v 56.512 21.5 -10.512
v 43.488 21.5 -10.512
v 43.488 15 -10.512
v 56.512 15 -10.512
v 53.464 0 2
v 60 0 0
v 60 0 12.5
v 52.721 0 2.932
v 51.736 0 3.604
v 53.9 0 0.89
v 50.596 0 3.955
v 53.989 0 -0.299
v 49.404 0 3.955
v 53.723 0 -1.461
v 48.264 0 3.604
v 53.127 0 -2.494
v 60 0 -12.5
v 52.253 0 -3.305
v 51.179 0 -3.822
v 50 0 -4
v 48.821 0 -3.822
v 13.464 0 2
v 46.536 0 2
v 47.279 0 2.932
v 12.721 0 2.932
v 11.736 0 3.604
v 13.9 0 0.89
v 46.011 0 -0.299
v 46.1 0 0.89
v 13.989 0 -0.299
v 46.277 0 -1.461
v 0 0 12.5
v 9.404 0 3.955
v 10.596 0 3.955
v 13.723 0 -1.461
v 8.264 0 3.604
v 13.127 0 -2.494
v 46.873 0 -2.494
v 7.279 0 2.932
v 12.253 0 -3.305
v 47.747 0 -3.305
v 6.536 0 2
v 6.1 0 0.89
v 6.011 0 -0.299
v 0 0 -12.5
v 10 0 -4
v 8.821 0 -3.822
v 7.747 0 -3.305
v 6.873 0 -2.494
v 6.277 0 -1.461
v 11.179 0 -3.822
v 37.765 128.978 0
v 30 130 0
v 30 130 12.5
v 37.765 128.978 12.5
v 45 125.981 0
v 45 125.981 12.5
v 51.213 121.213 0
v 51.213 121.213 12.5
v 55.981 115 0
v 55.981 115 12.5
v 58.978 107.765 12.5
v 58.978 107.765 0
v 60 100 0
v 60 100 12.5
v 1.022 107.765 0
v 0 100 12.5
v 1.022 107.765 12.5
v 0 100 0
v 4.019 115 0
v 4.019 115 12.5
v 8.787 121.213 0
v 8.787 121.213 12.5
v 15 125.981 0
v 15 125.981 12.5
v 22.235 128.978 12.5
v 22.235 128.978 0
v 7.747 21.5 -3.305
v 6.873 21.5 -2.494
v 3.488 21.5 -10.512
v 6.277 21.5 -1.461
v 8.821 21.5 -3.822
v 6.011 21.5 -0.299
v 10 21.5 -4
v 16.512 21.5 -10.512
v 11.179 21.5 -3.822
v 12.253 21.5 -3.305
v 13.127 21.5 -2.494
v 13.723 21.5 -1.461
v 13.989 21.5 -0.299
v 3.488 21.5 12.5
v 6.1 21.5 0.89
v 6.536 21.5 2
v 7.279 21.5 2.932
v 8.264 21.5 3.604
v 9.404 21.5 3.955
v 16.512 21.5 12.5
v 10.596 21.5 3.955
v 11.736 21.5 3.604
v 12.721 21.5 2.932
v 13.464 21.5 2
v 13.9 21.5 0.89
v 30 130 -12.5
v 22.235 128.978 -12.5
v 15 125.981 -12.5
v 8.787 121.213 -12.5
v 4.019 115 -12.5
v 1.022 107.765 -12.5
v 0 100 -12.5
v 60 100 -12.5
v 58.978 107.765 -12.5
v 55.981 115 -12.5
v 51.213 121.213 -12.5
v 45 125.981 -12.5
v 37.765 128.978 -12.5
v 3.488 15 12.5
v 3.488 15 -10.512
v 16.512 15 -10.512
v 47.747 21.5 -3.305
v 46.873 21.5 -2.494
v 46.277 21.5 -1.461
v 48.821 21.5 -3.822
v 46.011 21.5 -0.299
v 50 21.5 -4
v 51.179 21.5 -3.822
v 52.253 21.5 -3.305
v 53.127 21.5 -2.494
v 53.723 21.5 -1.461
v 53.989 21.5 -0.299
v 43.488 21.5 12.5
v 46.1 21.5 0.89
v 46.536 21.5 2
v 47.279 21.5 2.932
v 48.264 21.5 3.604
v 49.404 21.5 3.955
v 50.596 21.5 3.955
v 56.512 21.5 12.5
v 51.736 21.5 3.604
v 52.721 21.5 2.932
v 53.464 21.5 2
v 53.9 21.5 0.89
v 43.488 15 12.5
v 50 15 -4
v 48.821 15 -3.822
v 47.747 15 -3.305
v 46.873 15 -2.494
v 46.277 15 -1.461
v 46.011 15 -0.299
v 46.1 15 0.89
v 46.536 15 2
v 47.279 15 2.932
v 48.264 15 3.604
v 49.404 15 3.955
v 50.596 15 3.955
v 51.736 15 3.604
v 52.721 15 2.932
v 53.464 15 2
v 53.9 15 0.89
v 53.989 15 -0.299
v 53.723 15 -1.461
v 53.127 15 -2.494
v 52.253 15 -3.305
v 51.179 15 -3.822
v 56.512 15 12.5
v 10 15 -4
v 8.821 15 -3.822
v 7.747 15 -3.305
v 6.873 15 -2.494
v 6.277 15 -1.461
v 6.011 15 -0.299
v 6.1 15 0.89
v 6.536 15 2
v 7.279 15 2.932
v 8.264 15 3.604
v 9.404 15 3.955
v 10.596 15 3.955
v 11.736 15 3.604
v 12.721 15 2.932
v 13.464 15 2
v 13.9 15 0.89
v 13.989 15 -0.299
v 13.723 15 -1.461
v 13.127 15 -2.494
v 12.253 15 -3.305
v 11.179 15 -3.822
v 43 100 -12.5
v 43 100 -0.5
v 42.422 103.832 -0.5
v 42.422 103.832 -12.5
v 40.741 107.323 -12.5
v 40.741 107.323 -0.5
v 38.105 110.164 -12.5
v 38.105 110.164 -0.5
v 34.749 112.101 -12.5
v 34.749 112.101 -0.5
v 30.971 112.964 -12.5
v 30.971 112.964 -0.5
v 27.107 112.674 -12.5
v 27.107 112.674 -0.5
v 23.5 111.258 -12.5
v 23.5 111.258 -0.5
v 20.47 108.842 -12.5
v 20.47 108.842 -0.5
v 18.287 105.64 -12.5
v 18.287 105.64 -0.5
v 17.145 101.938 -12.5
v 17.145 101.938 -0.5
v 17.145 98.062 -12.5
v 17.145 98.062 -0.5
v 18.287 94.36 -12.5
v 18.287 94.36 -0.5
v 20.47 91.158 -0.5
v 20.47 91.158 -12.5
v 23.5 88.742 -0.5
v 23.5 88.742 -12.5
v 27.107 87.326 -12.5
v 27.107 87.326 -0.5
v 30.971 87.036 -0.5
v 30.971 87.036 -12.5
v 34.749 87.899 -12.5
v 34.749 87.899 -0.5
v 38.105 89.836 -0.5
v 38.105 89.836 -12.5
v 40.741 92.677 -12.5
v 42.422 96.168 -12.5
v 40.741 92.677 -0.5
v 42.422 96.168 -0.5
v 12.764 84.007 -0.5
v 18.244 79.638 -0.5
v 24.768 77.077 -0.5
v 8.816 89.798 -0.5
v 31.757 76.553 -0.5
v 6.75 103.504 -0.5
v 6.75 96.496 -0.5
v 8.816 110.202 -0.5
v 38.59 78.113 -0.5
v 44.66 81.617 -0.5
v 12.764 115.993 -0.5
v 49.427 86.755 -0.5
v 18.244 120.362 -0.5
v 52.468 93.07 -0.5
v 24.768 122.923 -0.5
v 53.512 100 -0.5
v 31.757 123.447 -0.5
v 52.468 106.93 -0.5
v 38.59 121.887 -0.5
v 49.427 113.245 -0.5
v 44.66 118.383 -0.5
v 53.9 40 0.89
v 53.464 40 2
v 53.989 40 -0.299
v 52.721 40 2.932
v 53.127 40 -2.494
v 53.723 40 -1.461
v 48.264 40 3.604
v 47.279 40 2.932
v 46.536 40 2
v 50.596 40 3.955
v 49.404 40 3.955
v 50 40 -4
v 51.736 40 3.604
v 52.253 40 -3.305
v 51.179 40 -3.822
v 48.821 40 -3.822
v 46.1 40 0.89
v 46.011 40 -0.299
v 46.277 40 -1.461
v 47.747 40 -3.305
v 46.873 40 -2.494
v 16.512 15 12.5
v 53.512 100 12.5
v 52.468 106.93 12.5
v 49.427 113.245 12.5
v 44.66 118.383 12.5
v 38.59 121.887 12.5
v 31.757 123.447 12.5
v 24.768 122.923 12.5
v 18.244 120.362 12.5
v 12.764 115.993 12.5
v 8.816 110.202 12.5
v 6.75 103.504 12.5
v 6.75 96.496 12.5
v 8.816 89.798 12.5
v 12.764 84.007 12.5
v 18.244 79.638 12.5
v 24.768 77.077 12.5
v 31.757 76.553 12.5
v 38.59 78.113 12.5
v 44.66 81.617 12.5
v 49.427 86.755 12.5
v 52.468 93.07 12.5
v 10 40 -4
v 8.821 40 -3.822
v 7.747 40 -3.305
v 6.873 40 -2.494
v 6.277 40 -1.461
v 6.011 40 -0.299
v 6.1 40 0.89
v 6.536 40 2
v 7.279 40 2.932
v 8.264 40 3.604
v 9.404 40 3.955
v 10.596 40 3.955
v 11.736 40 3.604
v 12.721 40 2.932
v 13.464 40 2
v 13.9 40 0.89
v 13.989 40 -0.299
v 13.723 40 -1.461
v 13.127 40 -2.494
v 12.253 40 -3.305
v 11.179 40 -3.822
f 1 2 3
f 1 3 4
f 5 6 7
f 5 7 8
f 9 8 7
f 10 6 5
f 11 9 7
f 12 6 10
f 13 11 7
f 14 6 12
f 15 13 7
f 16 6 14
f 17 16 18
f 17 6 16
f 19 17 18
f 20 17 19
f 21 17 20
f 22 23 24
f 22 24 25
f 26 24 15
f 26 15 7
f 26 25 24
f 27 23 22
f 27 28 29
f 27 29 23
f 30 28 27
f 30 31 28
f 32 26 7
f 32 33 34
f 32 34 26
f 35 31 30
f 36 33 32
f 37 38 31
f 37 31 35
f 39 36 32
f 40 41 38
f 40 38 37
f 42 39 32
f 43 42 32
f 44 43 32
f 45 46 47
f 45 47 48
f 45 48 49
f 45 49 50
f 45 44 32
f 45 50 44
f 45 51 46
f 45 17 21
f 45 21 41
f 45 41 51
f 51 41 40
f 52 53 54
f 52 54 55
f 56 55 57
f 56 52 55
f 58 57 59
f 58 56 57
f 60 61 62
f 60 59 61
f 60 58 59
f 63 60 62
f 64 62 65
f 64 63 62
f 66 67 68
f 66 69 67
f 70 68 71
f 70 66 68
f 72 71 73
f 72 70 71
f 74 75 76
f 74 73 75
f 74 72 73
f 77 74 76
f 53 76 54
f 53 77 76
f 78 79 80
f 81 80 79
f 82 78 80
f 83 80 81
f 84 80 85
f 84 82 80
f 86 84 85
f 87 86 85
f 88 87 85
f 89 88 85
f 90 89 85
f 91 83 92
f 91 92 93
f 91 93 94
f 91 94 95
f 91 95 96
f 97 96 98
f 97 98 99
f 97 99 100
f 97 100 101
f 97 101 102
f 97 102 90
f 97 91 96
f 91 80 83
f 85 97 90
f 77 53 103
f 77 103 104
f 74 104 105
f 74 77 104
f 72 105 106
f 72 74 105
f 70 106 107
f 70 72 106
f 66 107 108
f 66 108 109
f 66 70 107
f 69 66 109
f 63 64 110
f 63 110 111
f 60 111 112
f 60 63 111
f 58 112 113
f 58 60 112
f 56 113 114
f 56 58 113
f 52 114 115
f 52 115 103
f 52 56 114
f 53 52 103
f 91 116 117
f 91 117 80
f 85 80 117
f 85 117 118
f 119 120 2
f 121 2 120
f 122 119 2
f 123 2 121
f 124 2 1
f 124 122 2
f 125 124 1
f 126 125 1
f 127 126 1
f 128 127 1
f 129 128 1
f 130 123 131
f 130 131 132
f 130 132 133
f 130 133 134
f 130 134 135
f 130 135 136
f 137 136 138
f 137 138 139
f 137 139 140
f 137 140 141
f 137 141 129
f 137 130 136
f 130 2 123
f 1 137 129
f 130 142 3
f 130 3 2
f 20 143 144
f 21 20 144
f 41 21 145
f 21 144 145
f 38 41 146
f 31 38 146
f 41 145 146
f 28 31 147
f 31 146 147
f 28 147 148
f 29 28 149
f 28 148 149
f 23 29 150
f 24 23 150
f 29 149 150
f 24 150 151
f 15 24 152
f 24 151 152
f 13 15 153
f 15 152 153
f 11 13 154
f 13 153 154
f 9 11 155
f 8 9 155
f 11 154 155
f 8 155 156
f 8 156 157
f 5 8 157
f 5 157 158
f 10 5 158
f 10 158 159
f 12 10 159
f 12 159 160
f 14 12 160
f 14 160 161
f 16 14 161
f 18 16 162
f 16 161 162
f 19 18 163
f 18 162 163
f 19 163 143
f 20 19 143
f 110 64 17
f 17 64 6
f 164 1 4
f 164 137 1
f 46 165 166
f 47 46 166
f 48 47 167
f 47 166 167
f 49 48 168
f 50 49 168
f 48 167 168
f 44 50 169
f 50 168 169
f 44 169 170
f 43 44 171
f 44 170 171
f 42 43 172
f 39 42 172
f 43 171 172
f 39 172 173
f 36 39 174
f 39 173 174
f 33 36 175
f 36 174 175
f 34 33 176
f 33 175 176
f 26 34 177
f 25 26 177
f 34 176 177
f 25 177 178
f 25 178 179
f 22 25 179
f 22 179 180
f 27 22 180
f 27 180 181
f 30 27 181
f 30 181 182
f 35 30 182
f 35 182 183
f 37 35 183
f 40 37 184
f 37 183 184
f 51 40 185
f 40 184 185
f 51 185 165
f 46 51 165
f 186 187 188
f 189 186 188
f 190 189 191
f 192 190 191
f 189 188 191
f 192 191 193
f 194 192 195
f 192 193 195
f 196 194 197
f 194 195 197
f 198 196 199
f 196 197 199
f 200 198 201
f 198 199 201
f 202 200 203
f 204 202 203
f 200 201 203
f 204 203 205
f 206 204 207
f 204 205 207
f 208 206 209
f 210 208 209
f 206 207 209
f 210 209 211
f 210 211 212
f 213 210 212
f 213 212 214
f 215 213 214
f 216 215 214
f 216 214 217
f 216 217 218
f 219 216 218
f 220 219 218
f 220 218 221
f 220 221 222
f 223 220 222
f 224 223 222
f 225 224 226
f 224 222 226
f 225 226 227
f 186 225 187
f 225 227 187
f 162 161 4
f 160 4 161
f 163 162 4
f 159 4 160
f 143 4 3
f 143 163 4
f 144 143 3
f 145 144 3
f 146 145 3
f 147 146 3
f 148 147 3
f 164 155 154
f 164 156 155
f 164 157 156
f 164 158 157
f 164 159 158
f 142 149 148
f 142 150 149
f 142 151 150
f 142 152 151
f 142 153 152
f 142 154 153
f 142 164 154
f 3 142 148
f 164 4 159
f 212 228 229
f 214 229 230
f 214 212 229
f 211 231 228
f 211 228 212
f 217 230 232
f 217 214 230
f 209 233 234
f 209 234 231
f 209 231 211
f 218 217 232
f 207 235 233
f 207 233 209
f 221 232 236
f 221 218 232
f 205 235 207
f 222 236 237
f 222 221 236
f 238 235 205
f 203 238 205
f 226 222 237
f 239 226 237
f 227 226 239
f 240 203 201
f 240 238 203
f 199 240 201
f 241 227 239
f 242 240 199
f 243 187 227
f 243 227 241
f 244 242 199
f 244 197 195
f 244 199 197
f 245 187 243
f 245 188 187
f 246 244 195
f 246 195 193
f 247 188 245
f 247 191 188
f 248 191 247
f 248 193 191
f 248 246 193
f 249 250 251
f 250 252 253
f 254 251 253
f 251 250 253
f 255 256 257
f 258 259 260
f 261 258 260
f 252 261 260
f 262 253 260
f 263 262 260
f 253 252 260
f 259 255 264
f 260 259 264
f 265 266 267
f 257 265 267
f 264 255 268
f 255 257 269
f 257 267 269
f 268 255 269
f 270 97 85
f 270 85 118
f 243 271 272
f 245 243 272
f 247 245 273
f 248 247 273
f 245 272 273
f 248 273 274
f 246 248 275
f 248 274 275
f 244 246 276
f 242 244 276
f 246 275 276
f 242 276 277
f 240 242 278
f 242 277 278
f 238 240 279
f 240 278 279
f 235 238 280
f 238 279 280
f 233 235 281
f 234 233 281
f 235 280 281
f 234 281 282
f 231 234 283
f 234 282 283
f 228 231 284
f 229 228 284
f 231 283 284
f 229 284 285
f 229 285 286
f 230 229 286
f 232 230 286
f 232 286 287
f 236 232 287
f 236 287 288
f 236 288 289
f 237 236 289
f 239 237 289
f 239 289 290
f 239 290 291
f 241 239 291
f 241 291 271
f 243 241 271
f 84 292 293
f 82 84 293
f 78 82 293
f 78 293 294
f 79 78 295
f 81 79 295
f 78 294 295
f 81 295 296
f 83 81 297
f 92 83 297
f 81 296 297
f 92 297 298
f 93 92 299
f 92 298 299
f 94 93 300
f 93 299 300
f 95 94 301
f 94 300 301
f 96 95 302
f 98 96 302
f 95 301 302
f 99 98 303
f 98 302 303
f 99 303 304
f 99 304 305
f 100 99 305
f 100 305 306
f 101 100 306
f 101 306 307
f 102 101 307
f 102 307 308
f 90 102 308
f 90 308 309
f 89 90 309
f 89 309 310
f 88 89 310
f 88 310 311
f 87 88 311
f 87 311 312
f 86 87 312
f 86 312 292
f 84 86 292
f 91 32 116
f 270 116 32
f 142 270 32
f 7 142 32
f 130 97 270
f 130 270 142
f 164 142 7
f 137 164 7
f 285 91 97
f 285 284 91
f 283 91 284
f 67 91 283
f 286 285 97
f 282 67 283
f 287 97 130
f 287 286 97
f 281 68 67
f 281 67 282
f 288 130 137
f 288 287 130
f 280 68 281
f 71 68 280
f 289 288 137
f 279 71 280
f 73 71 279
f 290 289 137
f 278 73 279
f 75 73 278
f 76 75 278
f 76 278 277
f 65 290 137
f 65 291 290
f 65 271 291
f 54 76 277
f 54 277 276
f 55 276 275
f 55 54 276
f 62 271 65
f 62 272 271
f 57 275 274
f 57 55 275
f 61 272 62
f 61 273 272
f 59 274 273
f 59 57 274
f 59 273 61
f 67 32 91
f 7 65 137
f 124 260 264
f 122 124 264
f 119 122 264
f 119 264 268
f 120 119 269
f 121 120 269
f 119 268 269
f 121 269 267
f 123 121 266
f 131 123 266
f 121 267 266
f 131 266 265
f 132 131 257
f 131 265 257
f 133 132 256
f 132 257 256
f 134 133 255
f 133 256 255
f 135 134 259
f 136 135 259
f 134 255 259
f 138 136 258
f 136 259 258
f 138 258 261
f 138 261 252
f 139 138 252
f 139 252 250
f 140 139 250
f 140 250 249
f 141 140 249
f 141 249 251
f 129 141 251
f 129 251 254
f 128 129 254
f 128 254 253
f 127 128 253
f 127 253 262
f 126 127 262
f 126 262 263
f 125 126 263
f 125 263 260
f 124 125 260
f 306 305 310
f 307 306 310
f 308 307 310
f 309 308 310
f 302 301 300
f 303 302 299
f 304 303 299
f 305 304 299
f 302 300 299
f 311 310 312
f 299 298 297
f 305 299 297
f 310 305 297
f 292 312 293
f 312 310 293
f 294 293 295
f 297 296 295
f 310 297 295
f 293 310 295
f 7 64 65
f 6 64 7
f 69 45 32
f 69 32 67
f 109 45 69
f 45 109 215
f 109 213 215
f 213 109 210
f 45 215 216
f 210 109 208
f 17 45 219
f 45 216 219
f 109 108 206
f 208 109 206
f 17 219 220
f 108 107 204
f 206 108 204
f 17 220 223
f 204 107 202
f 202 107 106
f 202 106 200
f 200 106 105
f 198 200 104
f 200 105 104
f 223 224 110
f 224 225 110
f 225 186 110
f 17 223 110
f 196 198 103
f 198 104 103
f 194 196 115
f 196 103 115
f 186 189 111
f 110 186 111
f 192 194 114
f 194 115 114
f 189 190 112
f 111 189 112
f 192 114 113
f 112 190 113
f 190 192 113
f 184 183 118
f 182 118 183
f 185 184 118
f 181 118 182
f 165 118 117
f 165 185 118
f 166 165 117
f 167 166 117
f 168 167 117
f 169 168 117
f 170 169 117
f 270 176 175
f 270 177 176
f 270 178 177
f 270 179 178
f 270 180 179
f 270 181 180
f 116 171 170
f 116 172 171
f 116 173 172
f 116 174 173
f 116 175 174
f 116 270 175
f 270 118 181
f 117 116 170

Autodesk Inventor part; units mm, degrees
ref_plane "YZ Plane" through (0, 0, 0) normal (1, 0, 0) x (0, 1, 0)
ref_plane "XZ Plane" through (0, 0, 0) normal (0, 1, 0) x (-1, 0, 0)
ref_plane "XY Plane" through (0, 0, 0) normal (0, 0, 1) x (1, 0, 0)
sketch "Boceto1" plane through (0, 0, 0) normal (0, 0, 1) x (1, 0, 0)
  point P0 (0, 0)
sketch "Boceto2" plane through (0, 0, 0) normal (0, 0, 1) x (1, 0, 0)
  line L0 (0, 0) -> (0, 100)
  line L1 (30, 130) -> (30, 130)
  line L2 (60, 100) -> (60, 0)
  line L3 (60, 0) -> (0, 0)
  arc A0 (30, 130) -> (0, 100) centre (30, 100) ccw
  arc A1 (60, 100) -> (30, 130) centre (30, 100) ccw
  point P0 (0, 130)
  point P1 (60, 130)
  dimension "d1" = 30
  dimension "d2" = 100
  dimension "d3" = 60
extrude "Extrusión1" add sketch "Boceto2" along normal mid plane 25
sketch "Boceto9" plane through (0, 0, 12.5) normal (0, -1, 0) x (1, 0, 0)
  circle A0 centre (50, -12.5) radius 4
  line L0 (60, -25) -> (0, -25) projected
  circle A1 centre (10, -12.5) radius 4
  line L1 (0, -12.5) -> (60, -12.5) construction
  line L2 (60, 0) -> (60, -25) construction
  line L3 (0, -25) -> (0, 0) construction
  dimension "d52" = 8
  dimension "d88" = 10
  dimension "d89" = 10
  dimension "d90" = 8
hole "Agujero4" at (10, 0, 0) at (50, 0, 0) direction (0, 1, 0) diameter 8 depth 40
thread "Rosca3" size "M8x1.25" class "6H" standard "ANSI Metric M Profile" full length
thread "Rosca4" size "M8x1.25" class "6H" standard "ANSI Metric M Profile" full length
sketch "Boceto10" plane through (0, 0, 12.5) normal (0, 0, 1) x (1, 0, 0)
  circle A0 centre (30, 100) radius 13
  circle A1 centre (30, 100) radius 23.5125
  line L0 (60, 0) -> (60, 100) projected
  line L1 (0, 100) -> (0, 0) projected
  line L2 (40, 144.843) -> (20, 144.843) projected
  dimension "d64" = 26
  dimension "d65" = 30
  dimension "d68" = 47.025
  dimension "d91" = 100
extrude "Extrusión5" cut sketch "Boceto10" against normal through all contours A0
extrude "Extrusión6" cut sketch "Boceto10" against normal blind 13
sketch "Boceto12" plane through (0, 0, 12.5) normal (0, 0, 1) x (1, 0, 0)
  line L0 (6, 40) -> (14, 40) construction
  line L1 (10, 40) -> (10, 0) construction
  line L2 (46, 40) -> (54, 40) construction
  line L3 (50, 40) -> (50, 0) construction
  line L4 (0, 0) -> (60, 0) construction
  line L5 (3.4875, 21.5) -> (16.5125, 21.5)
  line L6 (16.5125, 21.5) -> (16.5125, 15)
  line L7 (16.5125, 15) -> (3.4875, 15)
  line L8 (3.4875, 15) -> (3.4875, 21.5)
  line L9 (43.4875, 21.5) -> (56.5125, 21.5)
  line L10 (43.4875, 15) -> (43.4875, 21.5)
  line L11 (56.5125, 15) -> (43.4875, 15)
  line L12 (56.5125, 21.5) -> (56.5125, 15)
  dimension "d92" = 13.025
  dimension "d93" = 6.5125
  dimension "d94" = 15
  dimension "d95" = 6.5
  dimension "d98" = 40
extrude "Extrusión7" cut sketch "Boceto12" against normal blind 23.0125
properties part number "soporte_riel" material "Nilón 6/6"
